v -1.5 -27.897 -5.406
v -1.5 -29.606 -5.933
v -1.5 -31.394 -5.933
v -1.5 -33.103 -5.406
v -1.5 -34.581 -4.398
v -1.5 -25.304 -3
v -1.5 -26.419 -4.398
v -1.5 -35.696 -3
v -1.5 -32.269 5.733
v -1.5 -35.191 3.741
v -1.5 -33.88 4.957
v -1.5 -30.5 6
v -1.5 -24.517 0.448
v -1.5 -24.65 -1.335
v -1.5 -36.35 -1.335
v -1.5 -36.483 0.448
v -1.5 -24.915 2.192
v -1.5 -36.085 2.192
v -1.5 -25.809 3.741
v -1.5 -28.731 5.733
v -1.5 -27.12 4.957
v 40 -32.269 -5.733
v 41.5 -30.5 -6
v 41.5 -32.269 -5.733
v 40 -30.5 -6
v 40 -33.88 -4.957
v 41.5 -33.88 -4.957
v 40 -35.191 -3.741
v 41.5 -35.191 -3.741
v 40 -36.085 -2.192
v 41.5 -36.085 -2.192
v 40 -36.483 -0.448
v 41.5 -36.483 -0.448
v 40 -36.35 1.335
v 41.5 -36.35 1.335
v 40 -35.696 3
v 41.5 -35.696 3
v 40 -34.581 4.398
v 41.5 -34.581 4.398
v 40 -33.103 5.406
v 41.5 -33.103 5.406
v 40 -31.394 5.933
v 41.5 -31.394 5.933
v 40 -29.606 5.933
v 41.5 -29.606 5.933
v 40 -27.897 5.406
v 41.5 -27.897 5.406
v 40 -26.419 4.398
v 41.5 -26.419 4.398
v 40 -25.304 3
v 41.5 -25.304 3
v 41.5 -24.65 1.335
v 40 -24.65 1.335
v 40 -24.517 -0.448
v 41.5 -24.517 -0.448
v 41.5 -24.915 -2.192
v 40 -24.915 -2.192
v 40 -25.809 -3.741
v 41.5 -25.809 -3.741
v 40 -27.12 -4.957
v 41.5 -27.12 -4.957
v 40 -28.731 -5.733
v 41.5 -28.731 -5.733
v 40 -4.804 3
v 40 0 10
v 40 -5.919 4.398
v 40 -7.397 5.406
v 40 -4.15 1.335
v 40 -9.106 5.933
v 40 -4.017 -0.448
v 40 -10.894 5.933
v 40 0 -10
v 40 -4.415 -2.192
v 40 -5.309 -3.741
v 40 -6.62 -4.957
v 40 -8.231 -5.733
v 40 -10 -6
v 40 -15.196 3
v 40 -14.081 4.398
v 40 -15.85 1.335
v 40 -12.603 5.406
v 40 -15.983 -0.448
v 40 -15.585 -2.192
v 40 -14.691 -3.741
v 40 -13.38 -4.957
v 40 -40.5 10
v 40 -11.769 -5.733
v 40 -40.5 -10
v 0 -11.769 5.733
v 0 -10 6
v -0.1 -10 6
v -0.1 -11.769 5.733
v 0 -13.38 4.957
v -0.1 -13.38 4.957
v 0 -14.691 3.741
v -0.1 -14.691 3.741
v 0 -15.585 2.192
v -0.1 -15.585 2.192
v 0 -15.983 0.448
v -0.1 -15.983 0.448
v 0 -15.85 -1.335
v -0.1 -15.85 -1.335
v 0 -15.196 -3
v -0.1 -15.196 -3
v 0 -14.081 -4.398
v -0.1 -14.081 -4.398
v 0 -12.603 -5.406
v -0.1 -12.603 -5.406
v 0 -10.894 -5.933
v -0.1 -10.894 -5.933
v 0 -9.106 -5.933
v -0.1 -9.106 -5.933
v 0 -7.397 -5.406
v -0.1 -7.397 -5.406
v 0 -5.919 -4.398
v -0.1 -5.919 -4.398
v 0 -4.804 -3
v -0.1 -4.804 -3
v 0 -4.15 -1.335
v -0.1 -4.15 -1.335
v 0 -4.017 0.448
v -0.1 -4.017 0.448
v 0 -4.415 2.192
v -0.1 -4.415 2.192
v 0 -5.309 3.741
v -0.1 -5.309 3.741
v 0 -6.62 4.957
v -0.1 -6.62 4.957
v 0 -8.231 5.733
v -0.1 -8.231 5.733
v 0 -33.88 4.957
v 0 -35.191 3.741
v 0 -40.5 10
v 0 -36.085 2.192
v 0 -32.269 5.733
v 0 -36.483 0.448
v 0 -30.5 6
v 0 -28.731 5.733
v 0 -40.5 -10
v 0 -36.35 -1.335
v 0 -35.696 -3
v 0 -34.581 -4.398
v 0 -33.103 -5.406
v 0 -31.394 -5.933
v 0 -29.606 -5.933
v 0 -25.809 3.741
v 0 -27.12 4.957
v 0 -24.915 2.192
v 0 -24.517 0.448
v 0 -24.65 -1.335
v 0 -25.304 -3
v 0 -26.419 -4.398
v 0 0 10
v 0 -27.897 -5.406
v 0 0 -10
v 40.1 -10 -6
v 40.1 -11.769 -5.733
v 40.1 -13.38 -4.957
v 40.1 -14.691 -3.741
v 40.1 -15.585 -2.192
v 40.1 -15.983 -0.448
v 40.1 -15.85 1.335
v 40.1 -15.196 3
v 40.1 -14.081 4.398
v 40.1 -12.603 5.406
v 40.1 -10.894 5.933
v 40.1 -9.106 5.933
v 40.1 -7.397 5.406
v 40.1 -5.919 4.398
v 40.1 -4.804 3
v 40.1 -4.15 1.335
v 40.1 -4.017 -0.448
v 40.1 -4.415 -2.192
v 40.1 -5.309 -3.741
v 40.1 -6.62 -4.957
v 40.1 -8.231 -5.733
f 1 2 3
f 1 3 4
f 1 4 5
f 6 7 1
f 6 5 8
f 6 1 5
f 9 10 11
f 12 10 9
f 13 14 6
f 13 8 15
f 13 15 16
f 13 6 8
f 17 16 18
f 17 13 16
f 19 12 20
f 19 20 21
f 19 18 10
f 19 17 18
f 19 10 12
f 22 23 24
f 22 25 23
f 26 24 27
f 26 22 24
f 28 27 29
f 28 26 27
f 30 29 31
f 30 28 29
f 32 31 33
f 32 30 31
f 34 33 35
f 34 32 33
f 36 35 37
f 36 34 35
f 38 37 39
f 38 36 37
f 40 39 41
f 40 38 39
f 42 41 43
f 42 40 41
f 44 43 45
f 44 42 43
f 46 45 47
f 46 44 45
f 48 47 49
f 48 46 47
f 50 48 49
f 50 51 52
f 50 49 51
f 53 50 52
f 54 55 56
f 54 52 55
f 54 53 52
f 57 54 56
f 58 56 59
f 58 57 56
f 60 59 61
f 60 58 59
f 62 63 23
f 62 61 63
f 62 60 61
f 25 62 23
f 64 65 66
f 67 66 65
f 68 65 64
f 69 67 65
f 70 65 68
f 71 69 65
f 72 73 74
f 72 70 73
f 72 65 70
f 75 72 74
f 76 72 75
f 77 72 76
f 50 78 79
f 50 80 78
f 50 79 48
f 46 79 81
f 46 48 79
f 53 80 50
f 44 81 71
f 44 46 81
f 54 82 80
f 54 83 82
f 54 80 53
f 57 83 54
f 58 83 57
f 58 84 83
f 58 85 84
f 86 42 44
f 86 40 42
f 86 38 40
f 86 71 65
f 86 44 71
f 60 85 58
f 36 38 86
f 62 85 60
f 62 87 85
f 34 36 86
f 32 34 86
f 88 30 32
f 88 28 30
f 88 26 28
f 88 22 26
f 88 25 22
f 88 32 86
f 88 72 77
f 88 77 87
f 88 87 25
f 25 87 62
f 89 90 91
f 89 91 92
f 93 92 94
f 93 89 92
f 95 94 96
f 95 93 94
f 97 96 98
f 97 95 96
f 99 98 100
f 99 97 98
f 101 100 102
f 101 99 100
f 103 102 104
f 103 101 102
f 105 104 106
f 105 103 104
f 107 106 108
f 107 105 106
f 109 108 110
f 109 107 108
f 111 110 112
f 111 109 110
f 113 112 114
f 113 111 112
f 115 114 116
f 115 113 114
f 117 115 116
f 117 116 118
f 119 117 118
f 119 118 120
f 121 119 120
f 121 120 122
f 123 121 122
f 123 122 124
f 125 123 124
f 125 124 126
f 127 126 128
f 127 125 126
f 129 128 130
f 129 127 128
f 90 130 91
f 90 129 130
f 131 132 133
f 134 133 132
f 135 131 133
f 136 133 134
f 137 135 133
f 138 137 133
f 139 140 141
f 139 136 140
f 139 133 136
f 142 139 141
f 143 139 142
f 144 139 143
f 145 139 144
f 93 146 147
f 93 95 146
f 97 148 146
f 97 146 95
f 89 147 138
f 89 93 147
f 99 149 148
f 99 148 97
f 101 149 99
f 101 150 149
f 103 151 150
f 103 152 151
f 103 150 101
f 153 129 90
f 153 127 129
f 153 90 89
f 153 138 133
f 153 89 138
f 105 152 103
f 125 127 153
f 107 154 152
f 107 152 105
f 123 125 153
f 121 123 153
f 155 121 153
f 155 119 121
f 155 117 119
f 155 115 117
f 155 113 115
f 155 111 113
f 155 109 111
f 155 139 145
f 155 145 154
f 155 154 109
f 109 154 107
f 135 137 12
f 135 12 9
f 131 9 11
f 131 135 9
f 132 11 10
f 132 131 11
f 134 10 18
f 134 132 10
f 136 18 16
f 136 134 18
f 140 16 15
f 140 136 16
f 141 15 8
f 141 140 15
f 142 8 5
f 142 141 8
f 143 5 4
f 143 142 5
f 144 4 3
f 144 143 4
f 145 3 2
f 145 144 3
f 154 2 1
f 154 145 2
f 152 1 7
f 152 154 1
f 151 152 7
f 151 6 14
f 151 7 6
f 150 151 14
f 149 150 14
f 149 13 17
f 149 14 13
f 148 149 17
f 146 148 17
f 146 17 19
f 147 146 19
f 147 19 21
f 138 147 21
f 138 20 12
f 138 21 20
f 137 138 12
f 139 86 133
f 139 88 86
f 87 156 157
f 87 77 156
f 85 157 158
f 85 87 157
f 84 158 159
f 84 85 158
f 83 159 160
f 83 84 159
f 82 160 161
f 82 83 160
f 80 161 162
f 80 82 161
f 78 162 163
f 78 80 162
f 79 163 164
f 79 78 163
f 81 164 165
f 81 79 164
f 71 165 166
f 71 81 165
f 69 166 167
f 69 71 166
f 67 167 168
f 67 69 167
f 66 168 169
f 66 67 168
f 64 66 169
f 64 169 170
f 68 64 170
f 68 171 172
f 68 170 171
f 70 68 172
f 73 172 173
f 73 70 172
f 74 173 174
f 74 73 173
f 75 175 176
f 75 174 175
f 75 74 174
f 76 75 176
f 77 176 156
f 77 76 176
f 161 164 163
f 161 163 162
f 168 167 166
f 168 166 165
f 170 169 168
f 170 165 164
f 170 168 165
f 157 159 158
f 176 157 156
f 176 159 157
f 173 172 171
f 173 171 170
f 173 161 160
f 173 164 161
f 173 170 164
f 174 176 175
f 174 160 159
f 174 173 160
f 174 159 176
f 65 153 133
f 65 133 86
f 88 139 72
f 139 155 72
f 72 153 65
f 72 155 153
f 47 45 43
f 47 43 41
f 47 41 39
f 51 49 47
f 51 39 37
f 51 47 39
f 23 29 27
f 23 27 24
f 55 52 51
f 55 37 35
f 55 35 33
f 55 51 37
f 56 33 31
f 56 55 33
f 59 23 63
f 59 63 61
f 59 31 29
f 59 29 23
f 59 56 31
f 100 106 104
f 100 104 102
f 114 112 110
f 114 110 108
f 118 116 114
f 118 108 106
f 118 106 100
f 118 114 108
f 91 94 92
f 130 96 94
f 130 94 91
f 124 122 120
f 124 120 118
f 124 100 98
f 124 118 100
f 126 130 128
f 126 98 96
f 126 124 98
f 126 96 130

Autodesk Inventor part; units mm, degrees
ref_plane "YZ Plane" through (0, 0, 0) normal (1, 0, 0) x (0, 1, 0)
ref_plane "XZ Plane" through (0, 0, 0) normal (0, 1, 0) x (-1, 0, 0)
ref_plane "XY Plane" through (0, 0, 0) normal (0, 0, 1) x (1, 0, 0)
sketch "Sketch1" plane through (0, 0, 0) normal (0, 0, 1) x (1, 0, 0)
  line L0 (0, 0) -> (40, 0)
  line L1 (40, 0) -> (40, -40.5)
  line L2 (40, -40.5) -> (0, -40.5)
  line L3 (0, -40.5) -> (0, 0)
  dimension "d0" = 40
  dimension "d1" = 40.5
extrude "Extrusion1" add sketch "Sketch1" along normal mid plane 20
sketch "Sketch2" plane through (0, -40.5, 10) normal (-1, 0, 0) x (0, 0, 1)
  line L0 (0, 0) -> (-20, 0) projected
  line L1 (-20, 0) -> (-20, 40.5) projected
  line L2 (0, 40.5) -> (0, 0) projected
  circle A0 centre (-10, 10) radius 6
  line L3 (-20, 20.25) -> (0, 20.25)
  circle A1 centre (-10, 30.5) radius 6
  point P0 (-10, 40.5)
  dimension "d4" = 12
  dimension "d5" = 10
  dimension "d6" = 10
extrude "Extrusion2" add sketch "Sketch2" along normal blind 1.5 contours A0
sketch "Sketch3" plane through (40, -40.5, 10) normal (1, 0, 0) x (0, 0, -1)
  circle A0 centre (10, 10) radius 6 projected
  circle A1 centre (10, 10) radius 6
  line L0 (0, 40.5) -> (0, 0) projected
  line L1 (0, 20.25) -> (20, 20.25)
  line L2 (20, 0) -> (20, 40.5) projected
  circle A2 centre (10, 30.5) radius 6
  point P0 (10, 40.5)
extrude "Extrusion4" add sketch "Sketch3" along normal blind 1.5 contours A0
extrude "Extrusion5" add sketch "Sketch2" along normal blind 0.1 contours A1
extrude "Extrusion6" add sketch "Sketch3" along normal blind 0.1 contours A2
properties part number "Motor"
